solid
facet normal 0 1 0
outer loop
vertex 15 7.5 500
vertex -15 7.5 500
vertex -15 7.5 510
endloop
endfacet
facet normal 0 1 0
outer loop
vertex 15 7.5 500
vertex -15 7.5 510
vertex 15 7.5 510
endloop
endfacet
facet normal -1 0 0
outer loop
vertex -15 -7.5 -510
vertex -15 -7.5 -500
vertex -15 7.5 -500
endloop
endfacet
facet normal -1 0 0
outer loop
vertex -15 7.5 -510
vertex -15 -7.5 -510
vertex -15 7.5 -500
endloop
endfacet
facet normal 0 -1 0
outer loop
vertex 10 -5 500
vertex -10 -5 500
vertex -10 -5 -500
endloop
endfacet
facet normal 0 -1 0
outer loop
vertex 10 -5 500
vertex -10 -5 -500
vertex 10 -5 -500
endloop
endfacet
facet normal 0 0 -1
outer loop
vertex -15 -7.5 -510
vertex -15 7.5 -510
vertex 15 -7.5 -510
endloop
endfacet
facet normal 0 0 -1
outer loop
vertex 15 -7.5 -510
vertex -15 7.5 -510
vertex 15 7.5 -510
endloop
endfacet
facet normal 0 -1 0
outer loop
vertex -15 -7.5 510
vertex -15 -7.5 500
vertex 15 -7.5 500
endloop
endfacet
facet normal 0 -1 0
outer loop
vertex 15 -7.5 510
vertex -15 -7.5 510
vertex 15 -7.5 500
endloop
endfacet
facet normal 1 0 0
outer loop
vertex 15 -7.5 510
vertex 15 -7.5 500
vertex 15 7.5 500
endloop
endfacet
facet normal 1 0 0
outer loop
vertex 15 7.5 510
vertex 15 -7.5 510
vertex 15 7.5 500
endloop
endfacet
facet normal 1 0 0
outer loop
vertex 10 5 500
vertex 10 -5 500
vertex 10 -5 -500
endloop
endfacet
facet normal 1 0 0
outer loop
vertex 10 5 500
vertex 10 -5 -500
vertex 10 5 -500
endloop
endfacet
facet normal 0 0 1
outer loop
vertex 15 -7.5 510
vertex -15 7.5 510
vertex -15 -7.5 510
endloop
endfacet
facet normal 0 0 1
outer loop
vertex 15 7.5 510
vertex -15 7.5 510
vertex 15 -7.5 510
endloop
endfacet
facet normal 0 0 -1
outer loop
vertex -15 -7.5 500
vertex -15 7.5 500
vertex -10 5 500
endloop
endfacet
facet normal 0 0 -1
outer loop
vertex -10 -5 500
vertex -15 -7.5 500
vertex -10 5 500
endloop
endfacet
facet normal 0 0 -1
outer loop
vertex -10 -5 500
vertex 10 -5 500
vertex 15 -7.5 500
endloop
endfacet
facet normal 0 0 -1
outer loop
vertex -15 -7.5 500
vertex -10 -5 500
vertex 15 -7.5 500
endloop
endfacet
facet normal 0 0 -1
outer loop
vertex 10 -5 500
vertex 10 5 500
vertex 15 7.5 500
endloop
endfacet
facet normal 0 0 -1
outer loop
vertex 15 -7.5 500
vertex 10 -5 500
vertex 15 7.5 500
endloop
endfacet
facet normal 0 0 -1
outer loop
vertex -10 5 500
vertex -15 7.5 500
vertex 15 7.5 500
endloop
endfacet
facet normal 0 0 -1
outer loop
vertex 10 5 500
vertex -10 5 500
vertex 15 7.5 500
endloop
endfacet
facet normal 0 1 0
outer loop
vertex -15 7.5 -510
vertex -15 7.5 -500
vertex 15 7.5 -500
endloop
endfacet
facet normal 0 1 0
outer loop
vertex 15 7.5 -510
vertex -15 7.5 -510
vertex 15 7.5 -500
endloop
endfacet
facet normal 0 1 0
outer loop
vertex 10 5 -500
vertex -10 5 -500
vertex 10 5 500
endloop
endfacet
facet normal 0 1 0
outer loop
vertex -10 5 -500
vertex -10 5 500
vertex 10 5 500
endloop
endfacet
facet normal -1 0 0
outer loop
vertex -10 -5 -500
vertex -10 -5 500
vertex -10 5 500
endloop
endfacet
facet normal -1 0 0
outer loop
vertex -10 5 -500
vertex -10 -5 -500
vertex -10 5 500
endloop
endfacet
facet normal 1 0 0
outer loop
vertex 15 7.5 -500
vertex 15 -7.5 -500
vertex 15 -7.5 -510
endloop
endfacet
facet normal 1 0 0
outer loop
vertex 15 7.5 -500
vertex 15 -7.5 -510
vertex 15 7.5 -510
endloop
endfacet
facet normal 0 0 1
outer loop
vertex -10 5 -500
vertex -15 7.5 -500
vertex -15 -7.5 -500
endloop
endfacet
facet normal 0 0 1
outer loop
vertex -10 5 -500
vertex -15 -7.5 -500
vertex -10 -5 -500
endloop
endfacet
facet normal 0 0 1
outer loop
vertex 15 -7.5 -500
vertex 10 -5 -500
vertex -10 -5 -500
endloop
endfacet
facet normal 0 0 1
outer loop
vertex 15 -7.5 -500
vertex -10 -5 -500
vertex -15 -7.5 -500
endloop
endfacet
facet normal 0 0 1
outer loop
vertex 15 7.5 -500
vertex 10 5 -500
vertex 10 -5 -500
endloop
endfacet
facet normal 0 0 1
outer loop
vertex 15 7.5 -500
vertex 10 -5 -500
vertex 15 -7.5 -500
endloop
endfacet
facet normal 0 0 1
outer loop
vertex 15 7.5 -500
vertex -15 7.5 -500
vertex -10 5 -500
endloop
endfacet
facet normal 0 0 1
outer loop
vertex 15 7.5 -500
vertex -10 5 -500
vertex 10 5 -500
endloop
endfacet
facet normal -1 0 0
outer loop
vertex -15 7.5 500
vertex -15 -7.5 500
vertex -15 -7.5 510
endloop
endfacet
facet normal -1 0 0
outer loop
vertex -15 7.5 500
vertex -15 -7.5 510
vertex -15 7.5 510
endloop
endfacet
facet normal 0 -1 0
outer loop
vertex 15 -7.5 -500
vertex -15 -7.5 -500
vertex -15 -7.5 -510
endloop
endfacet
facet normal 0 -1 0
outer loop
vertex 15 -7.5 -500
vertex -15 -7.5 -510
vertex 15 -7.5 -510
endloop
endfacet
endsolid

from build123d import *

# Parameters (mm, degrees)
ESQUISSE1_W        = 20
ESQUISSE1_H        = 10
BOSS_EXTRU_1_DEPTH = 500
ESQUISSE2_W        = 30
ESQUISSE2_H        = 15
BOSS_EXTRU_2_DEPTH = 10


with BuildPart() as part:
    # Esquisse1 → Boss.-Extru.1 (new body)
    with BuildSketch(Plane.XY):
        Rectangle(ESQUISSE1_W, ESQUISSE1_H)
    boss_extru_1 = extrude(amount=BOSS_EXTRU_1_DEPTH)

    # Esquisse2 → Boss.-Extru.2 (add)
    with BuildSketch(Plane.XY.offset(500)):
        Rectangle(ESQUISSE2_W, ESQUISSE2_H)
    boss_extru_2 = extrude(amount=BOSS_EXTRU_2_DEPTH)

    # Symétrie1: Boss.-Extru.1, Boss.-Extru.2 across plane
    add(boss_extru_1.mirror(Plane.XY))
    add(boss_extru_2.mirror(Plane.XY))


solid = part.part
